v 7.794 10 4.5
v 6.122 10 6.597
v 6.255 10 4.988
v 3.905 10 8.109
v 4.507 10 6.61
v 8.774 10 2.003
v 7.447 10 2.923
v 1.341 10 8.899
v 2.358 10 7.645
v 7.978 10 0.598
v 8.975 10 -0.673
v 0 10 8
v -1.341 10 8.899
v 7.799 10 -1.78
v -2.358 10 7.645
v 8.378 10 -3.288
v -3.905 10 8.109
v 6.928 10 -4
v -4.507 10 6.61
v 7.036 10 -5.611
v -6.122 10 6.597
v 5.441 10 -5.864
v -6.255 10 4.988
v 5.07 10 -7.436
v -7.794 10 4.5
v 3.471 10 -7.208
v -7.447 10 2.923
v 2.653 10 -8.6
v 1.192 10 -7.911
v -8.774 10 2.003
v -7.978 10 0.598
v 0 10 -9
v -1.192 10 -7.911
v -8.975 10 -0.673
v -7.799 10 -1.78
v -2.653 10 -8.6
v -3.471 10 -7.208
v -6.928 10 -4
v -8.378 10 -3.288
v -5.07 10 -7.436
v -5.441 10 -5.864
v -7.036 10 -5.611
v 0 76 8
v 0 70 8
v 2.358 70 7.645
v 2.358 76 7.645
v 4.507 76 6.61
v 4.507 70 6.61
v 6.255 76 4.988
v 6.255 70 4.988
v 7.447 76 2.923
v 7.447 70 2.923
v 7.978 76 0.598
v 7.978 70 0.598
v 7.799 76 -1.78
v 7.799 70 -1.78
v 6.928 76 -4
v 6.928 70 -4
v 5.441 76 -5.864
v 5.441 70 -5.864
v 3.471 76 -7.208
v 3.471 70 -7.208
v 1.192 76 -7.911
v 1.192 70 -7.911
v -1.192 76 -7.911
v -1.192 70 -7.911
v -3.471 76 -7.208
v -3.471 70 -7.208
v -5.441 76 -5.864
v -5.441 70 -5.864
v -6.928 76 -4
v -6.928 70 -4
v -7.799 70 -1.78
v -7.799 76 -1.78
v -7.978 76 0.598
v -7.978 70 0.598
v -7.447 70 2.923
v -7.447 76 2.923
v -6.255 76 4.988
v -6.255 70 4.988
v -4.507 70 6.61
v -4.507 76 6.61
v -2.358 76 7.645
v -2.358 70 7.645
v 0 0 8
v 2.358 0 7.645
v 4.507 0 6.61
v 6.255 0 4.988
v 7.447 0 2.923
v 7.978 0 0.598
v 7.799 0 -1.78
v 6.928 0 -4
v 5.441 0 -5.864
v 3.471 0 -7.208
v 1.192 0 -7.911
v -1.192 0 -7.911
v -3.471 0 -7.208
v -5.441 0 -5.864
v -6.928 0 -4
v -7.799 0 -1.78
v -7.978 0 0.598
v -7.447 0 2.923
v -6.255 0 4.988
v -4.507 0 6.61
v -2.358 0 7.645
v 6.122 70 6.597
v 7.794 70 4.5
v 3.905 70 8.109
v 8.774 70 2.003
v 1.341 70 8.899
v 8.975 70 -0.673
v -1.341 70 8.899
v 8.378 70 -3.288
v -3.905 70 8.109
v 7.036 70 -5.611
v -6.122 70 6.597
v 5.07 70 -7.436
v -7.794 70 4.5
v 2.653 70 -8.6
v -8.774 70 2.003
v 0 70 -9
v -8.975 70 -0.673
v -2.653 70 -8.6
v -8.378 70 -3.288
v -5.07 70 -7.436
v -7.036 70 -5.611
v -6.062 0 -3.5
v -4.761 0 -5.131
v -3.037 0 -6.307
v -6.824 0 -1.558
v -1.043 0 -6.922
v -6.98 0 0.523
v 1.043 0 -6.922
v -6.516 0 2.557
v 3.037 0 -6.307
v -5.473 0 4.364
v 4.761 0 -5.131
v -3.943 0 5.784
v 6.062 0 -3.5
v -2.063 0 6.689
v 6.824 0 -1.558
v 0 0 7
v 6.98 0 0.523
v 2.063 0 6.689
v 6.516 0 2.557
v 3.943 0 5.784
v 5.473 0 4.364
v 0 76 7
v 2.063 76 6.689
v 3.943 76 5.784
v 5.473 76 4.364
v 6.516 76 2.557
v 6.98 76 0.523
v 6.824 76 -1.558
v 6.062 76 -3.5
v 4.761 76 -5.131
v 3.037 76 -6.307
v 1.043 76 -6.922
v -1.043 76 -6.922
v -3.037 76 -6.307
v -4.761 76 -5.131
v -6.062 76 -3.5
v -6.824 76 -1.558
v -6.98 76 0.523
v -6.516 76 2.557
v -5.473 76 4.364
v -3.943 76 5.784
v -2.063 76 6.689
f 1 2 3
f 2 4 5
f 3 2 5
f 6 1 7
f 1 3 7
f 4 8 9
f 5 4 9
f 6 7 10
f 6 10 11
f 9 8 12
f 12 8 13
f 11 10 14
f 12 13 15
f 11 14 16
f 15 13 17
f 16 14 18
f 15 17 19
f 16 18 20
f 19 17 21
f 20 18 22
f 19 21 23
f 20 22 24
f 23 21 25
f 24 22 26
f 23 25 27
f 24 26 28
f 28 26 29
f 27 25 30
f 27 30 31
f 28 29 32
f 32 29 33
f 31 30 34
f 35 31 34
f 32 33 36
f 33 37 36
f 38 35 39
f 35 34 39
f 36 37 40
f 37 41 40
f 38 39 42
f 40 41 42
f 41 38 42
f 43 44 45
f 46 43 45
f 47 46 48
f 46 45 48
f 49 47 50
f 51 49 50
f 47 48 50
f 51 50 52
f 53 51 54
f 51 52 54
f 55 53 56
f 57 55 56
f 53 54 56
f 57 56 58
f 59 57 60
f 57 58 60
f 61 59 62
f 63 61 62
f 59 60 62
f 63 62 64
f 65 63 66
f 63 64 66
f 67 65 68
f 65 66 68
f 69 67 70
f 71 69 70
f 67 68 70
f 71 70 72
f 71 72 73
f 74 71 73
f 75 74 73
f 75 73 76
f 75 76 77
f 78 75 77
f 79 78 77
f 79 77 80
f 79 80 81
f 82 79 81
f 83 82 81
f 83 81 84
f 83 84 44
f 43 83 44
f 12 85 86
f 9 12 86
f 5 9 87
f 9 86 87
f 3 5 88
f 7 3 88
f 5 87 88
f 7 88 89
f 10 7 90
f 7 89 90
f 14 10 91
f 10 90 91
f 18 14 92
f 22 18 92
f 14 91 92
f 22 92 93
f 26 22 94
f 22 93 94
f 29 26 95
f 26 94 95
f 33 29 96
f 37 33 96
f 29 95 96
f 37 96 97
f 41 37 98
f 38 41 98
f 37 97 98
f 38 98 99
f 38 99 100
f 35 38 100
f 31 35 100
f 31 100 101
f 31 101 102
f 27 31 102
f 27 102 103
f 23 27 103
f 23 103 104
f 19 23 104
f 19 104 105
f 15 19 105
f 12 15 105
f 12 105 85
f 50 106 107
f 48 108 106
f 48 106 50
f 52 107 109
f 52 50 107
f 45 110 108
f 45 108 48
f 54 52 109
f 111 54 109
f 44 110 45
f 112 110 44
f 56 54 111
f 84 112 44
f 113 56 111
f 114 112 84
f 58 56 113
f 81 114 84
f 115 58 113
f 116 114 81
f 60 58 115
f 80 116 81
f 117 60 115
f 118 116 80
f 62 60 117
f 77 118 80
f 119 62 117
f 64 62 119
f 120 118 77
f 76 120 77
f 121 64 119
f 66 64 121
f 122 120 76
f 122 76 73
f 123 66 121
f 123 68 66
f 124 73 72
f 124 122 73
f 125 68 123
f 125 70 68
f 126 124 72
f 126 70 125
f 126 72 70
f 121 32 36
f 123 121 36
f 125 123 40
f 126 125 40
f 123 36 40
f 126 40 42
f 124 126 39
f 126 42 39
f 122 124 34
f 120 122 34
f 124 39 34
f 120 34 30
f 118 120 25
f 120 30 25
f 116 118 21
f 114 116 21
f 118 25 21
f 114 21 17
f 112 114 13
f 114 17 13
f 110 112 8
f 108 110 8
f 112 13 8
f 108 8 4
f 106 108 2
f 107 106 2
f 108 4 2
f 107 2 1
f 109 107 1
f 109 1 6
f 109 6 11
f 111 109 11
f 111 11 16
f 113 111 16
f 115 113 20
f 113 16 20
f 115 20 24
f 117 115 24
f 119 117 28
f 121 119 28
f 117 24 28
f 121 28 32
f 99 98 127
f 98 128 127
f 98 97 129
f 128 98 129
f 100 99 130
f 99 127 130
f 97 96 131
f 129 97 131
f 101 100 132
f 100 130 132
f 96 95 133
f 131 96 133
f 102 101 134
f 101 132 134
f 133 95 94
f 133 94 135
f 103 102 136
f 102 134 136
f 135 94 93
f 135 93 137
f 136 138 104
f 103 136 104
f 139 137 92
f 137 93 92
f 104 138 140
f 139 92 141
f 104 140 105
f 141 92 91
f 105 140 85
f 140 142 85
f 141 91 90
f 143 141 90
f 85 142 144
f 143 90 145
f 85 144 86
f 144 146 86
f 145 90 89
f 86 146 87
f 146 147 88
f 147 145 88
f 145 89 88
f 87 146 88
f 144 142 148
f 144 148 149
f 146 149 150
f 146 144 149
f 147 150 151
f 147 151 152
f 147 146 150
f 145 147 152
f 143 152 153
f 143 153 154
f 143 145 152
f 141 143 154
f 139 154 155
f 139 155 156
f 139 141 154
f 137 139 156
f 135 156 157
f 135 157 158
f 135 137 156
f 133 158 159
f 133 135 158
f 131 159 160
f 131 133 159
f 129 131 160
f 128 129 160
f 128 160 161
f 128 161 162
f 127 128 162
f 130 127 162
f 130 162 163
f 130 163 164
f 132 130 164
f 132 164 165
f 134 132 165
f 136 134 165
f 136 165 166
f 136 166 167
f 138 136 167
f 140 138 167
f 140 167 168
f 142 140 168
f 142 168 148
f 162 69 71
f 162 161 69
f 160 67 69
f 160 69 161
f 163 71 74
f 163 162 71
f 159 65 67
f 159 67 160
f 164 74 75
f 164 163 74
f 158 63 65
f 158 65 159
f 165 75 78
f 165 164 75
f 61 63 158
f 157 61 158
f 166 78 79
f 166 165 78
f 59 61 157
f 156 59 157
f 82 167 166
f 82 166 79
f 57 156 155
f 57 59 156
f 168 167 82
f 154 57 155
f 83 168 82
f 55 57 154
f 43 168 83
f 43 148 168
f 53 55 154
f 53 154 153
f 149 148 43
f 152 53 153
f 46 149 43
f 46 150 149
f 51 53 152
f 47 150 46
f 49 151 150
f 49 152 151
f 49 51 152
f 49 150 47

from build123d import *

# Parameters (mm, degrees)
SKETCH2_R                = 8
SKETCH2_R_2              = 7
BOSS_EXTRUDE3_DEPTH      = 15
BOSS_EXTRUDE6_DEPTH      = 11
BOSS_EXTRUDE6_DEPTH_BACK = 40
SKETCH4_R                = 8
SKETCH4_R_2              = 7
SKETCH3_R                = 9
SKETCH3_R_2              = 8
BOSS_EXTRUDE7_DEPTH      = 60
SKETCH6_R                = 8
SKETCH6_R_2              = 7
BOSS_EXTRUDE8_DEPTH      = 31


with BuildPart() as part:
    # Sketch2 → Boss-Extrude3 (new body)
    with BuildSketch(Plane(origin=(0, 0, 0), x_dir=(1, 0, 0), z_dir=(0, 1, 0))):
        with Locations(Location((0, 0, 0), (0, 0, 270))):
            Circle(SKETCH2_R)
        with Locations(Location((0, 0, 0), (0, 0, 270))):
            Circle(SKETCH2_R_2, mode=Mode.SUBTRACT)
    extrude(amount=BOSS_EXTRUDE3_DEPTH)

    # Sketch4 → Boss-Extrude6 (add, two sides: drawn at the far end of the back side and taken through both)
    with BuildSketch(Plane(origin=(0, 45, 0), x_dir=(1, 0, 0), z_dir=(0, 1, 0)).offset(-BOSS_EXTRUDE6_DEPTH_BACK)):
        with Locations(Location((0, 0, 0), (0, 0, 270))):
            Circle(SKETCH4_R)
        with Locations(Location((0, 0, 0), (0, 0, 270))):
            Circle(SKETCH4_R_2, mode=Mode.SUBTRACT)
    extrude(amount=BOSS_EXTRUDE6_DEPTH + BOSS_EXTRUDE6_DEPTH_BACK)

    # Sketch3 → Boss-Extrude7 (add)
    with BuildSketch(Plane(origin=(0, 10, 0), x_dir=(1, 0, 0), z_dir=(0, 1, 0))):
        with Locations(Location((0, 0, 0), (0, 0, 90))):
            Circle(SKETCH3_R)
        with Locations(Location((0, 0, 0), (0, 0, 270))):
            Circle(SKETCH3_R_2, mode=Mode.SUBTRACT)
    extrude(amount=BOSS_EXTRUDE7_DEPTH)

    # Sketch6 → Boss-Extrude8 (add)
    with BuildSketch(Plane(origin=(0, 45, 0), x_dir=(1, 0, 0), z_dir=(0, 1, 0))):
        with Locations(Location((0, 0, 0), (0, 0, 270))):
            Circle(SKETCH6_R)
        with Locations(Location((0, 0, 0), (0, 0, 270))):
            Circle(SKETCH6_R_2, mode=Mode.SUBTRACT)
    extrude(amount=BOSS_EXTRUDE8_DEPTH)


solid = part.part
